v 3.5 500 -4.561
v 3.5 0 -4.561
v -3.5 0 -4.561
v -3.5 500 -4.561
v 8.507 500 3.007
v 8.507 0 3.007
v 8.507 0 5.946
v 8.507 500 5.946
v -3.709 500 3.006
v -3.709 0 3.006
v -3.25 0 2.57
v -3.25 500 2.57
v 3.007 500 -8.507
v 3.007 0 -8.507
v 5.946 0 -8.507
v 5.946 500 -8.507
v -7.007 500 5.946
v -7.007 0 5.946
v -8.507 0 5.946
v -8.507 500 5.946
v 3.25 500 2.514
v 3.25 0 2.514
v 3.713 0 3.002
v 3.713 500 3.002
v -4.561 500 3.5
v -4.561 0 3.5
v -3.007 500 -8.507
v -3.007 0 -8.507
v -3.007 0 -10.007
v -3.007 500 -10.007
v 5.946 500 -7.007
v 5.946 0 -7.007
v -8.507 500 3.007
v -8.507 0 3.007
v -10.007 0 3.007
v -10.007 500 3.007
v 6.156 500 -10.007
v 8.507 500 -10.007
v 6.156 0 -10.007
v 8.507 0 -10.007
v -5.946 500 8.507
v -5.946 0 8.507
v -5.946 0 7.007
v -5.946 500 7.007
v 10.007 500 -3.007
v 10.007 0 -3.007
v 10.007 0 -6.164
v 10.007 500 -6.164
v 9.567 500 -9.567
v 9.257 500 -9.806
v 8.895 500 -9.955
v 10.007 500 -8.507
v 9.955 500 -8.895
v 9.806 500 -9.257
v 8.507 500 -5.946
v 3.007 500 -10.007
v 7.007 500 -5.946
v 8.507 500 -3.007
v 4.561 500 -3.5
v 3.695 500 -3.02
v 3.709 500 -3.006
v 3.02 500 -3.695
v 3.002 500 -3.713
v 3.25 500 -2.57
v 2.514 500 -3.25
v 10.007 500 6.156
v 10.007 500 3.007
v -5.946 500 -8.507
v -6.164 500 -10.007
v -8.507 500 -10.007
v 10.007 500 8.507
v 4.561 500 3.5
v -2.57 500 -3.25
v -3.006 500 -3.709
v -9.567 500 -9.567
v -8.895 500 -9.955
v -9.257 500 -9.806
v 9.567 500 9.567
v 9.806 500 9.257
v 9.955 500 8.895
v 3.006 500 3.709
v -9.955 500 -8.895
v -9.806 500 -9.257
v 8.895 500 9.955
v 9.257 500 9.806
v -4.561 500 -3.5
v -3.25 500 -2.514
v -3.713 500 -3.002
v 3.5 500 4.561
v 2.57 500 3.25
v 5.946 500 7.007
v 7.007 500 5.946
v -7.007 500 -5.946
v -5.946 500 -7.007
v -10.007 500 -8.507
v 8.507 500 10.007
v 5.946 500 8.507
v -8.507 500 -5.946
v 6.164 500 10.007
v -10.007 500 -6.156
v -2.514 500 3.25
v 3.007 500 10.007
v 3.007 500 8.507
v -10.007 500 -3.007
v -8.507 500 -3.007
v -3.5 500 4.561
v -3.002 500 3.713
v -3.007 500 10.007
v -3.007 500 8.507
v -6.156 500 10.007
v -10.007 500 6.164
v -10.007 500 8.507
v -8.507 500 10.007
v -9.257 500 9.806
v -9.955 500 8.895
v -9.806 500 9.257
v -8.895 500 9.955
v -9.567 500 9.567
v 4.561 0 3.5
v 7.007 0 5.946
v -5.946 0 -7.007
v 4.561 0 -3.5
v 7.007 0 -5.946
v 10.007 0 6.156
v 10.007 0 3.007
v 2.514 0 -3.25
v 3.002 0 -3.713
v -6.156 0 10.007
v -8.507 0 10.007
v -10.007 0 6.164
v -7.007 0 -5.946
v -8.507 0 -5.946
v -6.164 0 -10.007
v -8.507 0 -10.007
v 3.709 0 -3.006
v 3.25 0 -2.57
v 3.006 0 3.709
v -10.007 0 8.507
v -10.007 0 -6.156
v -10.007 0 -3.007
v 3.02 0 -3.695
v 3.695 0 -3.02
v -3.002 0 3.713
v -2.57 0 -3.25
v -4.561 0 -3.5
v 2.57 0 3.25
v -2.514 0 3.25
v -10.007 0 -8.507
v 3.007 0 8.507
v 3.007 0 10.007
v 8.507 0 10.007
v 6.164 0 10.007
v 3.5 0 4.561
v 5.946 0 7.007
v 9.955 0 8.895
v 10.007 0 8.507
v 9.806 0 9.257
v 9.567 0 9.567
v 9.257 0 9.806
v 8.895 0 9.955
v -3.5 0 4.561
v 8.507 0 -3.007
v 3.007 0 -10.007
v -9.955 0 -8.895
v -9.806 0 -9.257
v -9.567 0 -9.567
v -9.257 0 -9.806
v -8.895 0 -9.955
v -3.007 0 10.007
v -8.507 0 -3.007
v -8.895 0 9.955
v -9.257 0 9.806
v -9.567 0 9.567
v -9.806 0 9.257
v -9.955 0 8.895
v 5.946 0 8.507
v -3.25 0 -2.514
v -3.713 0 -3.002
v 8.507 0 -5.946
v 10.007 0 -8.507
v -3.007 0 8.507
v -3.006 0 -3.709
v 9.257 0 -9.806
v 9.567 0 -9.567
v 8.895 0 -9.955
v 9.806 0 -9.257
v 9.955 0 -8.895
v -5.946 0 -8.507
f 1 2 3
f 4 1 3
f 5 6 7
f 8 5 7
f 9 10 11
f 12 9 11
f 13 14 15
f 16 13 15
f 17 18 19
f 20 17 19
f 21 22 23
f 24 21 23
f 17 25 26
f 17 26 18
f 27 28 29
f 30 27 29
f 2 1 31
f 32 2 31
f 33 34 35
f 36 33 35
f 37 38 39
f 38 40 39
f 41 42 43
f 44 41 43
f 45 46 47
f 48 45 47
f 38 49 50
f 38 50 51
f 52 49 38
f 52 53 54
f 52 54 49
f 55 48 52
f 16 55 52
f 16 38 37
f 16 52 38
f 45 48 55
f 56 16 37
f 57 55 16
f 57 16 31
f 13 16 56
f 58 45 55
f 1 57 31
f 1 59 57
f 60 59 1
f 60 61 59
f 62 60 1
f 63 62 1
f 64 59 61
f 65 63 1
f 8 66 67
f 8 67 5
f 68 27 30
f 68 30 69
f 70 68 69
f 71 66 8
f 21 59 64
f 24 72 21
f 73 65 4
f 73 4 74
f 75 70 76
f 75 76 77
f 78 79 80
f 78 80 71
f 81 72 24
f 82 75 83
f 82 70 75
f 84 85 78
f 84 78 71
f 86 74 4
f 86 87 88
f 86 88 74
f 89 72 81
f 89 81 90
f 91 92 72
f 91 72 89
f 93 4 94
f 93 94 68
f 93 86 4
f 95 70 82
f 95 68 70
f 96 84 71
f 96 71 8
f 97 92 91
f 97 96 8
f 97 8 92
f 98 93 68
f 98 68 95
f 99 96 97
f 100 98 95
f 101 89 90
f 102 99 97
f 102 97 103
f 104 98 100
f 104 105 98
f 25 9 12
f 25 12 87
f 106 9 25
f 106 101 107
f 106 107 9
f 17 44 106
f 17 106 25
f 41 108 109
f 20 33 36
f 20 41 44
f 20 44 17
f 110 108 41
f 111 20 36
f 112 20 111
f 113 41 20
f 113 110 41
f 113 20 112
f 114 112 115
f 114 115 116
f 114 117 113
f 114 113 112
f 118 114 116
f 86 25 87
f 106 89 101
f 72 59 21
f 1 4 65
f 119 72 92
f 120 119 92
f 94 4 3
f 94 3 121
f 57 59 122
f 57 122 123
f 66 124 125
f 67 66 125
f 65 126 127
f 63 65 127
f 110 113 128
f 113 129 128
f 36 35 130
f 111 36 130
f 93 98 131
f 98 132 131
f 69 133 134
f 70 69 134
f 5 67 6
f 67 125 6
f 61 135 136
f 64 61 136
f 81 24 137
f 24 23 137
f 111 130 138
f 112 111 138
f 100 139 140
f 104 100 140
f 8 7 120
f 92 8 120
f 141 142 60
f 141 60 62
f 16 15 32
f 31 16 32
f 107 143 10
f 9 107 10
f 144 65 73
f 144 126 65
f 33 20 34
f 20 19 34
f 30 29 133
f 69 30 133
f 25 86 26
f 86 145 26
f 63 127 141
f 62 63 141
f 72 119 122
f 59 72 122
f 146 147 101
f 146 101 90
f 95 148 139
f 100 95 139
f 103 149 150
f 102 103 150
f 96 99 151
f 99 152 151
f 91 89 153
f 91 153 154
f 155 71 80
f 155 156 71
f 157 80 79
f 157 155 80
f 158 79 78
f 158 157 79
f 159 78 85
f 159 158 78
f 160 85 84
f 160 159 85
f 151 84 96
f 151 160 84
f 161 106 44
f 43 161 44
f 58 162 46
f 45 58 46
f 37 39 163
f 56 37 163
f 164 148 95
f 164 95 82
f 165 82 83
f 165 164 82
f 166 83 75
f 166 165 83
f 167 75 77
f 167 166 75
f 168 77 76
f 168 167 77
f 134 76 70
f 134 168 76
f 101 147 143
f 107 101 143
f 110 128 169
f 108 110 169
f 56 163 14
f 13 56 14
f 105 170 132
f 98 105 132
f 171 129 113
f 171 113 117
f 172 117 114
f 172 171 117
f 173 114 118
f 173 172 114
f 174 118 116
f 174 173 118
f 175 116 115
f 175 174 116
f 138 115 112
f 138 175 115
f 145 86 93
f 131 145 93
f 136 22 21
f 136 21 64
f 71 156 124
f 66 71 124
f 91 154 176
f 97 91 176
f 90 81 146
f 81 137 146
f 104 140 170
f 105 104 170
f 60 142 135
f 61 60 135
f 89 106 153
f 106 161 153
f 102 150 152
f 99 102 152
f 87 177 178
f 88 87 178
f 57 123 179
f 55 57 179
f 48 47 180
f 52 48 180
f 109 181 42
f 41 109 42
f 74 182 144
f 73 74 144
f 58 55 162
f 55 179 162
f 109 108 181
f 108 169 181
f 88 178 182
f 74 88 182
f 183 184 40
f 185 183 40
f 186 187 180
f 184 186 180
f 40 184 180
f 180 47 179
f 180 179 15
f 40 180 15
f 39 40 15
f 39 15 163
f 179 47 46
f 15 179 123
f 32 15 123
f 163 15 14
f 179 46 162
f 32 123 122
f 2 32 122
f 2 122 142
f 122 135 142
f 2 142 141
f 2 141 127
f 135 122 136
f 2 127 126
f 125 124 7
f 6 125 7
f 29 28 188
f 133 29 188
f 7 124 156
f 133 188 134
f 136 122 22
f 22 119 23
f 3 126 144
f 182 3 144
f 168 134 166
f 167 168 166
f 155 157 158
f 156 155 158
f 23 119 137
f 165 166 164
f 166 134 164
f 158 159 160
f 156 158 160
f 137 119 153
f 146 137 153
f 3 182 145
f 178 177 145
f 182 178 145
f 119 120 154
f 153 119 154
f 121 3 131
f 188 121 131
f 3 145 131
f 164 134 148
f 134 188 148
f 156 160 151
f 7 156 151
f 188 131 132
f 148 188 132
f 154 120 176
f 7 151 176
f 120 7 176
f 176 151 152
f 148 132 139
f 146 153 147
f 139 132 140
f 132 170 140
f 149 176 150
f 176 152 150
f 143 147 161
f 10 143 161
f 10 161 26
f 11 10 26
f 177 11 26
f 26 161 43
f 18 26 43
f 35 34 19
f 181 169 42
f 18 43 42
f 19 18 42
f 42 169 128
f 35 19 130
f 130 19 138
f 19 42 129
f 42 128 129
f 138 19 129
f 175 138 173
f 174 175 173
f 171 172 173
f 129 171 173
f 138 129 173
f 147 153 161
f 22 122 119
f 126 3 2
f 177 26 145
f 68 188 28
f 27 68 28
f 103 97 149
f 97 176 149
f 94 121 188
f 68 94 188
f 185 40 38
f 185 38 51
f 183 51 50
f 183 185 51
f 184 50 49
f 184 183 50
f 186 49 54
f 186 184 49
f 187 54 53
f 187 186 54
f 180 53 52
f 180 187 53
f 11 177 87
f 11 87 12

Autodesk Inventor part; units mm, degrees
ref_plane "YZ Plane" through (0, 0, 0) normal (1, 0, 0) x (0, 1, 0)
ref_plane "XZ Plane" through (0, 0, 0) normal (0, 1, 0) x (-1, 0, 0)
ref_plane "XY Plane" through (0, 0, 0) normal (0, 0, 1) x (1, 0, 0)
sketch "Sketch1" plane through (0, 0, 0) normal (0, 1, 0) x (-1, 0, 0)
  line L0 (-8.5066, -10.0066) -> (8.5066, -10.0066)
  line L1 (10.0066, -9.9934) -> (10.0066, 8.5066) construction
  line L2 (8.5066, 10.0066) -> (-9.9934, 10.0066) construction
  line L3 (-10.0066, 8.5066) -> (-10.0066, -8.5066)
  line L4 (-10.0066, -10.0066) -> (10.0066, 10.0066) construction
  line L5 (10.0066, -9.9934) -> (-9.5735, 9.5609) construction
  line L6 (-3.5, -4.5607) -> (3.5, -4.5607)
  line L7 (4.5607, -3.5) -> (4.5607, 3.5)
  line L8 (3.5, 4.5607) -> (-3.5, 4.5607)
  line L9 (-4.5607, 3.5) -> (-4.5607, -3.5)
  line L10 (-4.75, -4.75) -> (4.75, 4.75) construction
  line L11 (8.5066, 10.0066) -> (6.1559, 10.0066)
  line L12 (5.9459, 8.5066) -> (5.9459, 7.0066)
  line L13 (7.0066, 5.9459) -> (8.5066, 5.9459)
  line L14 (10.0066, 6.164) -> (10.0066, 8.5066)
  line L15 (-3.25, -3.25) -> (3.25, 3.25) construction
  line L16 (3.25, -3.25) -> (-3.25, 3.25) construction
  line L17 (0, 0) -> (20.0131, 20.0131) construction
  line L18 (8.5066, 5.9459) -> (8.5066, 3.0066)
  line L19 (8.5066, 3.0066) -> (10.0066, 3.0066)
  line L20 (10.0066, 3.0066) -> (10.0066, 6.164)
  line L21 (6.1559, 10.0066) -> (3.0066, 10.0066)
  line L22 (3.0066, 10.0066) -> (3.0066, 8.5066)
  line L23 (3.0066, 8.5066) -> (5.9459, 8.5066)
  arc A0 (10.0066, 8.5066) -> (8.5066, 10.0066) centre (8.5066, 8.5066) ccw
  line L24 (0, -13.1094) -> (0, 17.292) construction
  line L25 (14.9507, 0) -> (-14.3529, 0) construction
  circle A1 centre (0, 0) radius 4.5962 construction
  line L26 (4.5607, 3.5) -> (7.0066, 5.9459)
  line L27 (3.5, 4.5607) -> (5.9459, 7.0066)
  line L28 (5.7658, 4.7051) -> (5.2355, 5.2355) construction
  line L29 (3.0066, 10.0066) -> (8.5066, 10.0066)
  line L30 (10.0066, 3.0066) -> (10.0066, 8.5066)
  line L31 (-88.3377, -18.3534) -> (-20.6276, -18.3534) construction
  line L32 (-20.6276, -18.3534) -> (-20.6276, -138.727) construction
  line L33 (-20.6276, -138.727) -> (-88.3377, -138.727) construction
  line L34 (-88.3377, -138.727) -> (-88.3377, -18.3534) construction
  line L35 (-10.0066, 8.5066) -> (-10.0066, 6.1559)
  arc A2 (-8.5066, 10.0066) -> (-10.0066, 8.5066) centre (-8.5066, 8.5066) ccw
  line L36 (-6.164, 10.0066) -> (-8.5066, 10.0066)
  line L37 (9.9934, 10.0066) -> (-8.5066, 10.0066) construction
  line L38 (-3.0066, 10.0066) -> (-6.164, 10.0066)
  line L39 (-5.9459, 8.5066) -> (-3.0066, 8.5066)
  line L40 (-3.0066, 8.5066) -> (-3.0066, 10.0066)
  line L41 (-5.9459, 7.0066) -> (-5.9459, 8.5066)
  line L42 (-3.5, 4.5607) -> (-5.9459, 7.0066)
  line L43 (-4.5607, 3.5) -> (-7.0066, 5.9459)
  line L44 (-8.5066, 5.9459) -> (-7.0066, 5.9459)
  line L45 (-8.5066, 3.0066) -> (-8.5066, 5.9459)
  line L46 (-10.0066, 8.5066) -> (-10.0066, -9.9934) construction
  line L47 (-10.0066, 3.0066) -> (-8.5066, 3.0066)
  line L48 (-10.0066, 6.1559) -> (-10.0066, 3.0066)
  line L49 (-8.5066, -10.0066) -> (-6.1559, -10.0066)
  arc A3 (-10.0066, -8.5066) -> (-8.5066, -10.0066) centre (-8.5066, -8.5066) ccw
  line L50 (-10.0066, -6.164) -> (-10.0066, -8.5066)
  line L51 (-10.0066, 9.9934) -> (-10.0066, -8.5066) construction
  line L52 (-10.0066, -3.0066) -> (-10.0066, -6.164)
  line L53 (-8.5066, -5.9459) -> (-8.5066, -3.0066)
  line L54 (-8.5066, -3.0066) -> (-10.0066, -3.0066)
  line L55 (-7.0066, -5.9459) -> (-8.5066, -5.9459)
  line L56 (-4.5607, -3.5) -> (-7.0066, -5.9459)
  line L57 (-3.5, -4.5607) -> (-5.9459, -7.0066)
  line L58 (-5.9459, -8.5066) -> (-5.9459, -7.0066)
  line L59 (-3.0066, -8.5066) -> (-5.9459, -8.5066)
  line L60 (-8.5066, -10.0066) -> (9.9934, -10.0066) construction
  line L61 (-3.0066, -10.0066) -> (-3.0066, -8.5066)
  line L62 (-6.1559, -10.0066) -> (-3.0066, -10.0066)
  line L63 (10.0066, -8.5066) -> (10.0066, -6.1559)
  arc A4 (8.5066, -10.0066) -> (10.0066, -8.5066) centre (8.5066, -8.5066) ccw
  line L64 (6.164, -10.0066) -> (8.5066, -10.0066)
  line L65 (-9.9934, -10.0066) -> (8.5066, -10.0066) construction
  line L66 (3.0066, -10.0066) -> (6.164, -10.0066)
  line L67 (5.9459, -8.5066) -> (3.0066, -8.5066)
  line L68 (3.0066, -8.5066) -> (3.0066, -10.0066)
  line L69 (5.9459, -7.0066) -> (5.9459, -8.5066)
  line L70 (3.5, -4.5607) -> (5.9459, -7.0066)
  line L71 (4.5607, -3.5) -> (7.0066, -5.9459)
  line L72 (8.5066, -5.9459) -> (7.0066, -5.9459)
  line L73 (8.5066, -3.0066) -> (8.5066, -5.9459)
  line L74 (10.0066, -8.5066) -> (10.0066, 9.9934) construction
  line L75 (10.0066, -3.0066) -> (8.5066, -3.0066)
  line L76 (10.0066, -6.1559) -> (10.0066, -3.0066)
  line L77 (-3.6951, -3.0204) -> (-3.0204, -3.6951)
  line L78 (-3.0204, -3.6951) -> (3.0204, 3.6951) construction
  line L79 (3.6951, 3.0204) -> (-3.6951, -3.0204) construction
  line L80 (3.7133, -3.0016) -> (3.0065, -3.7094)
  line L81 (3.0065, -3.7094) -> (-3.1656, 3.9057) construction
  line L82 (-3.8767, 3.1337) -> (3.7133, -3.0016) construction
  line L83 (3.7133, -3.0016) -> (3.0065, -3.7094)
  line L84 (0.4404, 0.4404) -> (0.8591, 0)
  line L85 (3.25, -2.5143) -> (3.7133, -3.0016)
  line L86 (3.0065, -3.7094) -> (2.5696, -3.25)
  line L87 (0, -0.5477) -> (-0.267, -0.267)
  line L88 (3.25, -3.25) -> (3.25, -3.2457)
  line L89 (3.25, -2.5143) -> (3.25, 2.5696)
  line L90 (2.5143, 3.25) -> (3.0016, 3.7133)
  line L91 (3.0016, 3.7133) -> (3.7094, 3.0065)
  line L92 (3.7094, 3.0065) -> (3.25, 2.5696)
  line L93 (-3.25, 2.5143) -> (-3.7133, 3.0016)
  line L94 (-3.7133, 3.0016) -> (-3.0065, 3.7094)
  line L95 (-3.0065, 3.7094) -> (-2.5696, 3.25)
  line L96 (-2.5143, -3.25) -> (-3.0016, -3.7133)
  line L97 (-3.0016, -3.7133) -> (-3.7094, -3.0065)
  line L98 (-3.7094, -3.0065) -> (-3.25, -2.5696)
  line L99 (-2.5143, -3.25) -> (2.5696, -3.25)
  line L100 (-3.25, 3.25) -> (-3.25, 3.2457)
  line L101 (-3.25, 2.5143) -> (-3.25, -2.5696)
  line L102 (2.5143, 3.25) -> (-2.5696, 3.25)
  point P0 (5.9459, 7.7566)
  point P1 (-10.0066, 10.0066)
  point P2 (-4.7051, 5.7658)
  point P3 (-7.7566, 5.9459)
  point P4 (-10.0066, -10.0066)
  point P5 (-5.7658, -4.7051)
  point P6 (-5.9459, -7.7566)
  point P7 (10.0066, -10.0066)
  point P8 (4.7051, -5.7658)
  point P9 (7.7566, -5.9459)
  point P10 (3.3599, -3.3555)
  point P11 (0.5158, 0.631)
  point P12 (3.3555, 3.3599)
  point P13 (-3.3599, 3.3555)
  point P14 (-3.3555, -3.3599)
  dimension "d0" = 20
  dimension "d1" = 1.5
  dimension "d2" = 1.5
  dimension "d3" = 1.5
  dimension "d4" = 0.75
  dimension "d5" = 7
  dimension "d6" = 7
  dimension "d46" = 1.5
  dimension "d57" = 360
  dimension "d61" = 7
  dimension "d66" = 360
extrude "Extrusion1" add sketch "Sketch1" along normal blind 500 contours A3 L3 L54 L53 L55 L56 L9 L43 L44 L45 L47 A2 L36 L38 L40 L39 L41 L42 L8 L27 L12 L23 L22 L21 L11 A0 L14 L20 L19 L18 L13 L26 L7 L71 L72 L73 L75 L76 L63 A4 L0 L68 L67 L69 L70 L6 L57 L58 L59 L61
properties part number "SIDE_BEAMSipt-01" material "Aluminum 6061"
